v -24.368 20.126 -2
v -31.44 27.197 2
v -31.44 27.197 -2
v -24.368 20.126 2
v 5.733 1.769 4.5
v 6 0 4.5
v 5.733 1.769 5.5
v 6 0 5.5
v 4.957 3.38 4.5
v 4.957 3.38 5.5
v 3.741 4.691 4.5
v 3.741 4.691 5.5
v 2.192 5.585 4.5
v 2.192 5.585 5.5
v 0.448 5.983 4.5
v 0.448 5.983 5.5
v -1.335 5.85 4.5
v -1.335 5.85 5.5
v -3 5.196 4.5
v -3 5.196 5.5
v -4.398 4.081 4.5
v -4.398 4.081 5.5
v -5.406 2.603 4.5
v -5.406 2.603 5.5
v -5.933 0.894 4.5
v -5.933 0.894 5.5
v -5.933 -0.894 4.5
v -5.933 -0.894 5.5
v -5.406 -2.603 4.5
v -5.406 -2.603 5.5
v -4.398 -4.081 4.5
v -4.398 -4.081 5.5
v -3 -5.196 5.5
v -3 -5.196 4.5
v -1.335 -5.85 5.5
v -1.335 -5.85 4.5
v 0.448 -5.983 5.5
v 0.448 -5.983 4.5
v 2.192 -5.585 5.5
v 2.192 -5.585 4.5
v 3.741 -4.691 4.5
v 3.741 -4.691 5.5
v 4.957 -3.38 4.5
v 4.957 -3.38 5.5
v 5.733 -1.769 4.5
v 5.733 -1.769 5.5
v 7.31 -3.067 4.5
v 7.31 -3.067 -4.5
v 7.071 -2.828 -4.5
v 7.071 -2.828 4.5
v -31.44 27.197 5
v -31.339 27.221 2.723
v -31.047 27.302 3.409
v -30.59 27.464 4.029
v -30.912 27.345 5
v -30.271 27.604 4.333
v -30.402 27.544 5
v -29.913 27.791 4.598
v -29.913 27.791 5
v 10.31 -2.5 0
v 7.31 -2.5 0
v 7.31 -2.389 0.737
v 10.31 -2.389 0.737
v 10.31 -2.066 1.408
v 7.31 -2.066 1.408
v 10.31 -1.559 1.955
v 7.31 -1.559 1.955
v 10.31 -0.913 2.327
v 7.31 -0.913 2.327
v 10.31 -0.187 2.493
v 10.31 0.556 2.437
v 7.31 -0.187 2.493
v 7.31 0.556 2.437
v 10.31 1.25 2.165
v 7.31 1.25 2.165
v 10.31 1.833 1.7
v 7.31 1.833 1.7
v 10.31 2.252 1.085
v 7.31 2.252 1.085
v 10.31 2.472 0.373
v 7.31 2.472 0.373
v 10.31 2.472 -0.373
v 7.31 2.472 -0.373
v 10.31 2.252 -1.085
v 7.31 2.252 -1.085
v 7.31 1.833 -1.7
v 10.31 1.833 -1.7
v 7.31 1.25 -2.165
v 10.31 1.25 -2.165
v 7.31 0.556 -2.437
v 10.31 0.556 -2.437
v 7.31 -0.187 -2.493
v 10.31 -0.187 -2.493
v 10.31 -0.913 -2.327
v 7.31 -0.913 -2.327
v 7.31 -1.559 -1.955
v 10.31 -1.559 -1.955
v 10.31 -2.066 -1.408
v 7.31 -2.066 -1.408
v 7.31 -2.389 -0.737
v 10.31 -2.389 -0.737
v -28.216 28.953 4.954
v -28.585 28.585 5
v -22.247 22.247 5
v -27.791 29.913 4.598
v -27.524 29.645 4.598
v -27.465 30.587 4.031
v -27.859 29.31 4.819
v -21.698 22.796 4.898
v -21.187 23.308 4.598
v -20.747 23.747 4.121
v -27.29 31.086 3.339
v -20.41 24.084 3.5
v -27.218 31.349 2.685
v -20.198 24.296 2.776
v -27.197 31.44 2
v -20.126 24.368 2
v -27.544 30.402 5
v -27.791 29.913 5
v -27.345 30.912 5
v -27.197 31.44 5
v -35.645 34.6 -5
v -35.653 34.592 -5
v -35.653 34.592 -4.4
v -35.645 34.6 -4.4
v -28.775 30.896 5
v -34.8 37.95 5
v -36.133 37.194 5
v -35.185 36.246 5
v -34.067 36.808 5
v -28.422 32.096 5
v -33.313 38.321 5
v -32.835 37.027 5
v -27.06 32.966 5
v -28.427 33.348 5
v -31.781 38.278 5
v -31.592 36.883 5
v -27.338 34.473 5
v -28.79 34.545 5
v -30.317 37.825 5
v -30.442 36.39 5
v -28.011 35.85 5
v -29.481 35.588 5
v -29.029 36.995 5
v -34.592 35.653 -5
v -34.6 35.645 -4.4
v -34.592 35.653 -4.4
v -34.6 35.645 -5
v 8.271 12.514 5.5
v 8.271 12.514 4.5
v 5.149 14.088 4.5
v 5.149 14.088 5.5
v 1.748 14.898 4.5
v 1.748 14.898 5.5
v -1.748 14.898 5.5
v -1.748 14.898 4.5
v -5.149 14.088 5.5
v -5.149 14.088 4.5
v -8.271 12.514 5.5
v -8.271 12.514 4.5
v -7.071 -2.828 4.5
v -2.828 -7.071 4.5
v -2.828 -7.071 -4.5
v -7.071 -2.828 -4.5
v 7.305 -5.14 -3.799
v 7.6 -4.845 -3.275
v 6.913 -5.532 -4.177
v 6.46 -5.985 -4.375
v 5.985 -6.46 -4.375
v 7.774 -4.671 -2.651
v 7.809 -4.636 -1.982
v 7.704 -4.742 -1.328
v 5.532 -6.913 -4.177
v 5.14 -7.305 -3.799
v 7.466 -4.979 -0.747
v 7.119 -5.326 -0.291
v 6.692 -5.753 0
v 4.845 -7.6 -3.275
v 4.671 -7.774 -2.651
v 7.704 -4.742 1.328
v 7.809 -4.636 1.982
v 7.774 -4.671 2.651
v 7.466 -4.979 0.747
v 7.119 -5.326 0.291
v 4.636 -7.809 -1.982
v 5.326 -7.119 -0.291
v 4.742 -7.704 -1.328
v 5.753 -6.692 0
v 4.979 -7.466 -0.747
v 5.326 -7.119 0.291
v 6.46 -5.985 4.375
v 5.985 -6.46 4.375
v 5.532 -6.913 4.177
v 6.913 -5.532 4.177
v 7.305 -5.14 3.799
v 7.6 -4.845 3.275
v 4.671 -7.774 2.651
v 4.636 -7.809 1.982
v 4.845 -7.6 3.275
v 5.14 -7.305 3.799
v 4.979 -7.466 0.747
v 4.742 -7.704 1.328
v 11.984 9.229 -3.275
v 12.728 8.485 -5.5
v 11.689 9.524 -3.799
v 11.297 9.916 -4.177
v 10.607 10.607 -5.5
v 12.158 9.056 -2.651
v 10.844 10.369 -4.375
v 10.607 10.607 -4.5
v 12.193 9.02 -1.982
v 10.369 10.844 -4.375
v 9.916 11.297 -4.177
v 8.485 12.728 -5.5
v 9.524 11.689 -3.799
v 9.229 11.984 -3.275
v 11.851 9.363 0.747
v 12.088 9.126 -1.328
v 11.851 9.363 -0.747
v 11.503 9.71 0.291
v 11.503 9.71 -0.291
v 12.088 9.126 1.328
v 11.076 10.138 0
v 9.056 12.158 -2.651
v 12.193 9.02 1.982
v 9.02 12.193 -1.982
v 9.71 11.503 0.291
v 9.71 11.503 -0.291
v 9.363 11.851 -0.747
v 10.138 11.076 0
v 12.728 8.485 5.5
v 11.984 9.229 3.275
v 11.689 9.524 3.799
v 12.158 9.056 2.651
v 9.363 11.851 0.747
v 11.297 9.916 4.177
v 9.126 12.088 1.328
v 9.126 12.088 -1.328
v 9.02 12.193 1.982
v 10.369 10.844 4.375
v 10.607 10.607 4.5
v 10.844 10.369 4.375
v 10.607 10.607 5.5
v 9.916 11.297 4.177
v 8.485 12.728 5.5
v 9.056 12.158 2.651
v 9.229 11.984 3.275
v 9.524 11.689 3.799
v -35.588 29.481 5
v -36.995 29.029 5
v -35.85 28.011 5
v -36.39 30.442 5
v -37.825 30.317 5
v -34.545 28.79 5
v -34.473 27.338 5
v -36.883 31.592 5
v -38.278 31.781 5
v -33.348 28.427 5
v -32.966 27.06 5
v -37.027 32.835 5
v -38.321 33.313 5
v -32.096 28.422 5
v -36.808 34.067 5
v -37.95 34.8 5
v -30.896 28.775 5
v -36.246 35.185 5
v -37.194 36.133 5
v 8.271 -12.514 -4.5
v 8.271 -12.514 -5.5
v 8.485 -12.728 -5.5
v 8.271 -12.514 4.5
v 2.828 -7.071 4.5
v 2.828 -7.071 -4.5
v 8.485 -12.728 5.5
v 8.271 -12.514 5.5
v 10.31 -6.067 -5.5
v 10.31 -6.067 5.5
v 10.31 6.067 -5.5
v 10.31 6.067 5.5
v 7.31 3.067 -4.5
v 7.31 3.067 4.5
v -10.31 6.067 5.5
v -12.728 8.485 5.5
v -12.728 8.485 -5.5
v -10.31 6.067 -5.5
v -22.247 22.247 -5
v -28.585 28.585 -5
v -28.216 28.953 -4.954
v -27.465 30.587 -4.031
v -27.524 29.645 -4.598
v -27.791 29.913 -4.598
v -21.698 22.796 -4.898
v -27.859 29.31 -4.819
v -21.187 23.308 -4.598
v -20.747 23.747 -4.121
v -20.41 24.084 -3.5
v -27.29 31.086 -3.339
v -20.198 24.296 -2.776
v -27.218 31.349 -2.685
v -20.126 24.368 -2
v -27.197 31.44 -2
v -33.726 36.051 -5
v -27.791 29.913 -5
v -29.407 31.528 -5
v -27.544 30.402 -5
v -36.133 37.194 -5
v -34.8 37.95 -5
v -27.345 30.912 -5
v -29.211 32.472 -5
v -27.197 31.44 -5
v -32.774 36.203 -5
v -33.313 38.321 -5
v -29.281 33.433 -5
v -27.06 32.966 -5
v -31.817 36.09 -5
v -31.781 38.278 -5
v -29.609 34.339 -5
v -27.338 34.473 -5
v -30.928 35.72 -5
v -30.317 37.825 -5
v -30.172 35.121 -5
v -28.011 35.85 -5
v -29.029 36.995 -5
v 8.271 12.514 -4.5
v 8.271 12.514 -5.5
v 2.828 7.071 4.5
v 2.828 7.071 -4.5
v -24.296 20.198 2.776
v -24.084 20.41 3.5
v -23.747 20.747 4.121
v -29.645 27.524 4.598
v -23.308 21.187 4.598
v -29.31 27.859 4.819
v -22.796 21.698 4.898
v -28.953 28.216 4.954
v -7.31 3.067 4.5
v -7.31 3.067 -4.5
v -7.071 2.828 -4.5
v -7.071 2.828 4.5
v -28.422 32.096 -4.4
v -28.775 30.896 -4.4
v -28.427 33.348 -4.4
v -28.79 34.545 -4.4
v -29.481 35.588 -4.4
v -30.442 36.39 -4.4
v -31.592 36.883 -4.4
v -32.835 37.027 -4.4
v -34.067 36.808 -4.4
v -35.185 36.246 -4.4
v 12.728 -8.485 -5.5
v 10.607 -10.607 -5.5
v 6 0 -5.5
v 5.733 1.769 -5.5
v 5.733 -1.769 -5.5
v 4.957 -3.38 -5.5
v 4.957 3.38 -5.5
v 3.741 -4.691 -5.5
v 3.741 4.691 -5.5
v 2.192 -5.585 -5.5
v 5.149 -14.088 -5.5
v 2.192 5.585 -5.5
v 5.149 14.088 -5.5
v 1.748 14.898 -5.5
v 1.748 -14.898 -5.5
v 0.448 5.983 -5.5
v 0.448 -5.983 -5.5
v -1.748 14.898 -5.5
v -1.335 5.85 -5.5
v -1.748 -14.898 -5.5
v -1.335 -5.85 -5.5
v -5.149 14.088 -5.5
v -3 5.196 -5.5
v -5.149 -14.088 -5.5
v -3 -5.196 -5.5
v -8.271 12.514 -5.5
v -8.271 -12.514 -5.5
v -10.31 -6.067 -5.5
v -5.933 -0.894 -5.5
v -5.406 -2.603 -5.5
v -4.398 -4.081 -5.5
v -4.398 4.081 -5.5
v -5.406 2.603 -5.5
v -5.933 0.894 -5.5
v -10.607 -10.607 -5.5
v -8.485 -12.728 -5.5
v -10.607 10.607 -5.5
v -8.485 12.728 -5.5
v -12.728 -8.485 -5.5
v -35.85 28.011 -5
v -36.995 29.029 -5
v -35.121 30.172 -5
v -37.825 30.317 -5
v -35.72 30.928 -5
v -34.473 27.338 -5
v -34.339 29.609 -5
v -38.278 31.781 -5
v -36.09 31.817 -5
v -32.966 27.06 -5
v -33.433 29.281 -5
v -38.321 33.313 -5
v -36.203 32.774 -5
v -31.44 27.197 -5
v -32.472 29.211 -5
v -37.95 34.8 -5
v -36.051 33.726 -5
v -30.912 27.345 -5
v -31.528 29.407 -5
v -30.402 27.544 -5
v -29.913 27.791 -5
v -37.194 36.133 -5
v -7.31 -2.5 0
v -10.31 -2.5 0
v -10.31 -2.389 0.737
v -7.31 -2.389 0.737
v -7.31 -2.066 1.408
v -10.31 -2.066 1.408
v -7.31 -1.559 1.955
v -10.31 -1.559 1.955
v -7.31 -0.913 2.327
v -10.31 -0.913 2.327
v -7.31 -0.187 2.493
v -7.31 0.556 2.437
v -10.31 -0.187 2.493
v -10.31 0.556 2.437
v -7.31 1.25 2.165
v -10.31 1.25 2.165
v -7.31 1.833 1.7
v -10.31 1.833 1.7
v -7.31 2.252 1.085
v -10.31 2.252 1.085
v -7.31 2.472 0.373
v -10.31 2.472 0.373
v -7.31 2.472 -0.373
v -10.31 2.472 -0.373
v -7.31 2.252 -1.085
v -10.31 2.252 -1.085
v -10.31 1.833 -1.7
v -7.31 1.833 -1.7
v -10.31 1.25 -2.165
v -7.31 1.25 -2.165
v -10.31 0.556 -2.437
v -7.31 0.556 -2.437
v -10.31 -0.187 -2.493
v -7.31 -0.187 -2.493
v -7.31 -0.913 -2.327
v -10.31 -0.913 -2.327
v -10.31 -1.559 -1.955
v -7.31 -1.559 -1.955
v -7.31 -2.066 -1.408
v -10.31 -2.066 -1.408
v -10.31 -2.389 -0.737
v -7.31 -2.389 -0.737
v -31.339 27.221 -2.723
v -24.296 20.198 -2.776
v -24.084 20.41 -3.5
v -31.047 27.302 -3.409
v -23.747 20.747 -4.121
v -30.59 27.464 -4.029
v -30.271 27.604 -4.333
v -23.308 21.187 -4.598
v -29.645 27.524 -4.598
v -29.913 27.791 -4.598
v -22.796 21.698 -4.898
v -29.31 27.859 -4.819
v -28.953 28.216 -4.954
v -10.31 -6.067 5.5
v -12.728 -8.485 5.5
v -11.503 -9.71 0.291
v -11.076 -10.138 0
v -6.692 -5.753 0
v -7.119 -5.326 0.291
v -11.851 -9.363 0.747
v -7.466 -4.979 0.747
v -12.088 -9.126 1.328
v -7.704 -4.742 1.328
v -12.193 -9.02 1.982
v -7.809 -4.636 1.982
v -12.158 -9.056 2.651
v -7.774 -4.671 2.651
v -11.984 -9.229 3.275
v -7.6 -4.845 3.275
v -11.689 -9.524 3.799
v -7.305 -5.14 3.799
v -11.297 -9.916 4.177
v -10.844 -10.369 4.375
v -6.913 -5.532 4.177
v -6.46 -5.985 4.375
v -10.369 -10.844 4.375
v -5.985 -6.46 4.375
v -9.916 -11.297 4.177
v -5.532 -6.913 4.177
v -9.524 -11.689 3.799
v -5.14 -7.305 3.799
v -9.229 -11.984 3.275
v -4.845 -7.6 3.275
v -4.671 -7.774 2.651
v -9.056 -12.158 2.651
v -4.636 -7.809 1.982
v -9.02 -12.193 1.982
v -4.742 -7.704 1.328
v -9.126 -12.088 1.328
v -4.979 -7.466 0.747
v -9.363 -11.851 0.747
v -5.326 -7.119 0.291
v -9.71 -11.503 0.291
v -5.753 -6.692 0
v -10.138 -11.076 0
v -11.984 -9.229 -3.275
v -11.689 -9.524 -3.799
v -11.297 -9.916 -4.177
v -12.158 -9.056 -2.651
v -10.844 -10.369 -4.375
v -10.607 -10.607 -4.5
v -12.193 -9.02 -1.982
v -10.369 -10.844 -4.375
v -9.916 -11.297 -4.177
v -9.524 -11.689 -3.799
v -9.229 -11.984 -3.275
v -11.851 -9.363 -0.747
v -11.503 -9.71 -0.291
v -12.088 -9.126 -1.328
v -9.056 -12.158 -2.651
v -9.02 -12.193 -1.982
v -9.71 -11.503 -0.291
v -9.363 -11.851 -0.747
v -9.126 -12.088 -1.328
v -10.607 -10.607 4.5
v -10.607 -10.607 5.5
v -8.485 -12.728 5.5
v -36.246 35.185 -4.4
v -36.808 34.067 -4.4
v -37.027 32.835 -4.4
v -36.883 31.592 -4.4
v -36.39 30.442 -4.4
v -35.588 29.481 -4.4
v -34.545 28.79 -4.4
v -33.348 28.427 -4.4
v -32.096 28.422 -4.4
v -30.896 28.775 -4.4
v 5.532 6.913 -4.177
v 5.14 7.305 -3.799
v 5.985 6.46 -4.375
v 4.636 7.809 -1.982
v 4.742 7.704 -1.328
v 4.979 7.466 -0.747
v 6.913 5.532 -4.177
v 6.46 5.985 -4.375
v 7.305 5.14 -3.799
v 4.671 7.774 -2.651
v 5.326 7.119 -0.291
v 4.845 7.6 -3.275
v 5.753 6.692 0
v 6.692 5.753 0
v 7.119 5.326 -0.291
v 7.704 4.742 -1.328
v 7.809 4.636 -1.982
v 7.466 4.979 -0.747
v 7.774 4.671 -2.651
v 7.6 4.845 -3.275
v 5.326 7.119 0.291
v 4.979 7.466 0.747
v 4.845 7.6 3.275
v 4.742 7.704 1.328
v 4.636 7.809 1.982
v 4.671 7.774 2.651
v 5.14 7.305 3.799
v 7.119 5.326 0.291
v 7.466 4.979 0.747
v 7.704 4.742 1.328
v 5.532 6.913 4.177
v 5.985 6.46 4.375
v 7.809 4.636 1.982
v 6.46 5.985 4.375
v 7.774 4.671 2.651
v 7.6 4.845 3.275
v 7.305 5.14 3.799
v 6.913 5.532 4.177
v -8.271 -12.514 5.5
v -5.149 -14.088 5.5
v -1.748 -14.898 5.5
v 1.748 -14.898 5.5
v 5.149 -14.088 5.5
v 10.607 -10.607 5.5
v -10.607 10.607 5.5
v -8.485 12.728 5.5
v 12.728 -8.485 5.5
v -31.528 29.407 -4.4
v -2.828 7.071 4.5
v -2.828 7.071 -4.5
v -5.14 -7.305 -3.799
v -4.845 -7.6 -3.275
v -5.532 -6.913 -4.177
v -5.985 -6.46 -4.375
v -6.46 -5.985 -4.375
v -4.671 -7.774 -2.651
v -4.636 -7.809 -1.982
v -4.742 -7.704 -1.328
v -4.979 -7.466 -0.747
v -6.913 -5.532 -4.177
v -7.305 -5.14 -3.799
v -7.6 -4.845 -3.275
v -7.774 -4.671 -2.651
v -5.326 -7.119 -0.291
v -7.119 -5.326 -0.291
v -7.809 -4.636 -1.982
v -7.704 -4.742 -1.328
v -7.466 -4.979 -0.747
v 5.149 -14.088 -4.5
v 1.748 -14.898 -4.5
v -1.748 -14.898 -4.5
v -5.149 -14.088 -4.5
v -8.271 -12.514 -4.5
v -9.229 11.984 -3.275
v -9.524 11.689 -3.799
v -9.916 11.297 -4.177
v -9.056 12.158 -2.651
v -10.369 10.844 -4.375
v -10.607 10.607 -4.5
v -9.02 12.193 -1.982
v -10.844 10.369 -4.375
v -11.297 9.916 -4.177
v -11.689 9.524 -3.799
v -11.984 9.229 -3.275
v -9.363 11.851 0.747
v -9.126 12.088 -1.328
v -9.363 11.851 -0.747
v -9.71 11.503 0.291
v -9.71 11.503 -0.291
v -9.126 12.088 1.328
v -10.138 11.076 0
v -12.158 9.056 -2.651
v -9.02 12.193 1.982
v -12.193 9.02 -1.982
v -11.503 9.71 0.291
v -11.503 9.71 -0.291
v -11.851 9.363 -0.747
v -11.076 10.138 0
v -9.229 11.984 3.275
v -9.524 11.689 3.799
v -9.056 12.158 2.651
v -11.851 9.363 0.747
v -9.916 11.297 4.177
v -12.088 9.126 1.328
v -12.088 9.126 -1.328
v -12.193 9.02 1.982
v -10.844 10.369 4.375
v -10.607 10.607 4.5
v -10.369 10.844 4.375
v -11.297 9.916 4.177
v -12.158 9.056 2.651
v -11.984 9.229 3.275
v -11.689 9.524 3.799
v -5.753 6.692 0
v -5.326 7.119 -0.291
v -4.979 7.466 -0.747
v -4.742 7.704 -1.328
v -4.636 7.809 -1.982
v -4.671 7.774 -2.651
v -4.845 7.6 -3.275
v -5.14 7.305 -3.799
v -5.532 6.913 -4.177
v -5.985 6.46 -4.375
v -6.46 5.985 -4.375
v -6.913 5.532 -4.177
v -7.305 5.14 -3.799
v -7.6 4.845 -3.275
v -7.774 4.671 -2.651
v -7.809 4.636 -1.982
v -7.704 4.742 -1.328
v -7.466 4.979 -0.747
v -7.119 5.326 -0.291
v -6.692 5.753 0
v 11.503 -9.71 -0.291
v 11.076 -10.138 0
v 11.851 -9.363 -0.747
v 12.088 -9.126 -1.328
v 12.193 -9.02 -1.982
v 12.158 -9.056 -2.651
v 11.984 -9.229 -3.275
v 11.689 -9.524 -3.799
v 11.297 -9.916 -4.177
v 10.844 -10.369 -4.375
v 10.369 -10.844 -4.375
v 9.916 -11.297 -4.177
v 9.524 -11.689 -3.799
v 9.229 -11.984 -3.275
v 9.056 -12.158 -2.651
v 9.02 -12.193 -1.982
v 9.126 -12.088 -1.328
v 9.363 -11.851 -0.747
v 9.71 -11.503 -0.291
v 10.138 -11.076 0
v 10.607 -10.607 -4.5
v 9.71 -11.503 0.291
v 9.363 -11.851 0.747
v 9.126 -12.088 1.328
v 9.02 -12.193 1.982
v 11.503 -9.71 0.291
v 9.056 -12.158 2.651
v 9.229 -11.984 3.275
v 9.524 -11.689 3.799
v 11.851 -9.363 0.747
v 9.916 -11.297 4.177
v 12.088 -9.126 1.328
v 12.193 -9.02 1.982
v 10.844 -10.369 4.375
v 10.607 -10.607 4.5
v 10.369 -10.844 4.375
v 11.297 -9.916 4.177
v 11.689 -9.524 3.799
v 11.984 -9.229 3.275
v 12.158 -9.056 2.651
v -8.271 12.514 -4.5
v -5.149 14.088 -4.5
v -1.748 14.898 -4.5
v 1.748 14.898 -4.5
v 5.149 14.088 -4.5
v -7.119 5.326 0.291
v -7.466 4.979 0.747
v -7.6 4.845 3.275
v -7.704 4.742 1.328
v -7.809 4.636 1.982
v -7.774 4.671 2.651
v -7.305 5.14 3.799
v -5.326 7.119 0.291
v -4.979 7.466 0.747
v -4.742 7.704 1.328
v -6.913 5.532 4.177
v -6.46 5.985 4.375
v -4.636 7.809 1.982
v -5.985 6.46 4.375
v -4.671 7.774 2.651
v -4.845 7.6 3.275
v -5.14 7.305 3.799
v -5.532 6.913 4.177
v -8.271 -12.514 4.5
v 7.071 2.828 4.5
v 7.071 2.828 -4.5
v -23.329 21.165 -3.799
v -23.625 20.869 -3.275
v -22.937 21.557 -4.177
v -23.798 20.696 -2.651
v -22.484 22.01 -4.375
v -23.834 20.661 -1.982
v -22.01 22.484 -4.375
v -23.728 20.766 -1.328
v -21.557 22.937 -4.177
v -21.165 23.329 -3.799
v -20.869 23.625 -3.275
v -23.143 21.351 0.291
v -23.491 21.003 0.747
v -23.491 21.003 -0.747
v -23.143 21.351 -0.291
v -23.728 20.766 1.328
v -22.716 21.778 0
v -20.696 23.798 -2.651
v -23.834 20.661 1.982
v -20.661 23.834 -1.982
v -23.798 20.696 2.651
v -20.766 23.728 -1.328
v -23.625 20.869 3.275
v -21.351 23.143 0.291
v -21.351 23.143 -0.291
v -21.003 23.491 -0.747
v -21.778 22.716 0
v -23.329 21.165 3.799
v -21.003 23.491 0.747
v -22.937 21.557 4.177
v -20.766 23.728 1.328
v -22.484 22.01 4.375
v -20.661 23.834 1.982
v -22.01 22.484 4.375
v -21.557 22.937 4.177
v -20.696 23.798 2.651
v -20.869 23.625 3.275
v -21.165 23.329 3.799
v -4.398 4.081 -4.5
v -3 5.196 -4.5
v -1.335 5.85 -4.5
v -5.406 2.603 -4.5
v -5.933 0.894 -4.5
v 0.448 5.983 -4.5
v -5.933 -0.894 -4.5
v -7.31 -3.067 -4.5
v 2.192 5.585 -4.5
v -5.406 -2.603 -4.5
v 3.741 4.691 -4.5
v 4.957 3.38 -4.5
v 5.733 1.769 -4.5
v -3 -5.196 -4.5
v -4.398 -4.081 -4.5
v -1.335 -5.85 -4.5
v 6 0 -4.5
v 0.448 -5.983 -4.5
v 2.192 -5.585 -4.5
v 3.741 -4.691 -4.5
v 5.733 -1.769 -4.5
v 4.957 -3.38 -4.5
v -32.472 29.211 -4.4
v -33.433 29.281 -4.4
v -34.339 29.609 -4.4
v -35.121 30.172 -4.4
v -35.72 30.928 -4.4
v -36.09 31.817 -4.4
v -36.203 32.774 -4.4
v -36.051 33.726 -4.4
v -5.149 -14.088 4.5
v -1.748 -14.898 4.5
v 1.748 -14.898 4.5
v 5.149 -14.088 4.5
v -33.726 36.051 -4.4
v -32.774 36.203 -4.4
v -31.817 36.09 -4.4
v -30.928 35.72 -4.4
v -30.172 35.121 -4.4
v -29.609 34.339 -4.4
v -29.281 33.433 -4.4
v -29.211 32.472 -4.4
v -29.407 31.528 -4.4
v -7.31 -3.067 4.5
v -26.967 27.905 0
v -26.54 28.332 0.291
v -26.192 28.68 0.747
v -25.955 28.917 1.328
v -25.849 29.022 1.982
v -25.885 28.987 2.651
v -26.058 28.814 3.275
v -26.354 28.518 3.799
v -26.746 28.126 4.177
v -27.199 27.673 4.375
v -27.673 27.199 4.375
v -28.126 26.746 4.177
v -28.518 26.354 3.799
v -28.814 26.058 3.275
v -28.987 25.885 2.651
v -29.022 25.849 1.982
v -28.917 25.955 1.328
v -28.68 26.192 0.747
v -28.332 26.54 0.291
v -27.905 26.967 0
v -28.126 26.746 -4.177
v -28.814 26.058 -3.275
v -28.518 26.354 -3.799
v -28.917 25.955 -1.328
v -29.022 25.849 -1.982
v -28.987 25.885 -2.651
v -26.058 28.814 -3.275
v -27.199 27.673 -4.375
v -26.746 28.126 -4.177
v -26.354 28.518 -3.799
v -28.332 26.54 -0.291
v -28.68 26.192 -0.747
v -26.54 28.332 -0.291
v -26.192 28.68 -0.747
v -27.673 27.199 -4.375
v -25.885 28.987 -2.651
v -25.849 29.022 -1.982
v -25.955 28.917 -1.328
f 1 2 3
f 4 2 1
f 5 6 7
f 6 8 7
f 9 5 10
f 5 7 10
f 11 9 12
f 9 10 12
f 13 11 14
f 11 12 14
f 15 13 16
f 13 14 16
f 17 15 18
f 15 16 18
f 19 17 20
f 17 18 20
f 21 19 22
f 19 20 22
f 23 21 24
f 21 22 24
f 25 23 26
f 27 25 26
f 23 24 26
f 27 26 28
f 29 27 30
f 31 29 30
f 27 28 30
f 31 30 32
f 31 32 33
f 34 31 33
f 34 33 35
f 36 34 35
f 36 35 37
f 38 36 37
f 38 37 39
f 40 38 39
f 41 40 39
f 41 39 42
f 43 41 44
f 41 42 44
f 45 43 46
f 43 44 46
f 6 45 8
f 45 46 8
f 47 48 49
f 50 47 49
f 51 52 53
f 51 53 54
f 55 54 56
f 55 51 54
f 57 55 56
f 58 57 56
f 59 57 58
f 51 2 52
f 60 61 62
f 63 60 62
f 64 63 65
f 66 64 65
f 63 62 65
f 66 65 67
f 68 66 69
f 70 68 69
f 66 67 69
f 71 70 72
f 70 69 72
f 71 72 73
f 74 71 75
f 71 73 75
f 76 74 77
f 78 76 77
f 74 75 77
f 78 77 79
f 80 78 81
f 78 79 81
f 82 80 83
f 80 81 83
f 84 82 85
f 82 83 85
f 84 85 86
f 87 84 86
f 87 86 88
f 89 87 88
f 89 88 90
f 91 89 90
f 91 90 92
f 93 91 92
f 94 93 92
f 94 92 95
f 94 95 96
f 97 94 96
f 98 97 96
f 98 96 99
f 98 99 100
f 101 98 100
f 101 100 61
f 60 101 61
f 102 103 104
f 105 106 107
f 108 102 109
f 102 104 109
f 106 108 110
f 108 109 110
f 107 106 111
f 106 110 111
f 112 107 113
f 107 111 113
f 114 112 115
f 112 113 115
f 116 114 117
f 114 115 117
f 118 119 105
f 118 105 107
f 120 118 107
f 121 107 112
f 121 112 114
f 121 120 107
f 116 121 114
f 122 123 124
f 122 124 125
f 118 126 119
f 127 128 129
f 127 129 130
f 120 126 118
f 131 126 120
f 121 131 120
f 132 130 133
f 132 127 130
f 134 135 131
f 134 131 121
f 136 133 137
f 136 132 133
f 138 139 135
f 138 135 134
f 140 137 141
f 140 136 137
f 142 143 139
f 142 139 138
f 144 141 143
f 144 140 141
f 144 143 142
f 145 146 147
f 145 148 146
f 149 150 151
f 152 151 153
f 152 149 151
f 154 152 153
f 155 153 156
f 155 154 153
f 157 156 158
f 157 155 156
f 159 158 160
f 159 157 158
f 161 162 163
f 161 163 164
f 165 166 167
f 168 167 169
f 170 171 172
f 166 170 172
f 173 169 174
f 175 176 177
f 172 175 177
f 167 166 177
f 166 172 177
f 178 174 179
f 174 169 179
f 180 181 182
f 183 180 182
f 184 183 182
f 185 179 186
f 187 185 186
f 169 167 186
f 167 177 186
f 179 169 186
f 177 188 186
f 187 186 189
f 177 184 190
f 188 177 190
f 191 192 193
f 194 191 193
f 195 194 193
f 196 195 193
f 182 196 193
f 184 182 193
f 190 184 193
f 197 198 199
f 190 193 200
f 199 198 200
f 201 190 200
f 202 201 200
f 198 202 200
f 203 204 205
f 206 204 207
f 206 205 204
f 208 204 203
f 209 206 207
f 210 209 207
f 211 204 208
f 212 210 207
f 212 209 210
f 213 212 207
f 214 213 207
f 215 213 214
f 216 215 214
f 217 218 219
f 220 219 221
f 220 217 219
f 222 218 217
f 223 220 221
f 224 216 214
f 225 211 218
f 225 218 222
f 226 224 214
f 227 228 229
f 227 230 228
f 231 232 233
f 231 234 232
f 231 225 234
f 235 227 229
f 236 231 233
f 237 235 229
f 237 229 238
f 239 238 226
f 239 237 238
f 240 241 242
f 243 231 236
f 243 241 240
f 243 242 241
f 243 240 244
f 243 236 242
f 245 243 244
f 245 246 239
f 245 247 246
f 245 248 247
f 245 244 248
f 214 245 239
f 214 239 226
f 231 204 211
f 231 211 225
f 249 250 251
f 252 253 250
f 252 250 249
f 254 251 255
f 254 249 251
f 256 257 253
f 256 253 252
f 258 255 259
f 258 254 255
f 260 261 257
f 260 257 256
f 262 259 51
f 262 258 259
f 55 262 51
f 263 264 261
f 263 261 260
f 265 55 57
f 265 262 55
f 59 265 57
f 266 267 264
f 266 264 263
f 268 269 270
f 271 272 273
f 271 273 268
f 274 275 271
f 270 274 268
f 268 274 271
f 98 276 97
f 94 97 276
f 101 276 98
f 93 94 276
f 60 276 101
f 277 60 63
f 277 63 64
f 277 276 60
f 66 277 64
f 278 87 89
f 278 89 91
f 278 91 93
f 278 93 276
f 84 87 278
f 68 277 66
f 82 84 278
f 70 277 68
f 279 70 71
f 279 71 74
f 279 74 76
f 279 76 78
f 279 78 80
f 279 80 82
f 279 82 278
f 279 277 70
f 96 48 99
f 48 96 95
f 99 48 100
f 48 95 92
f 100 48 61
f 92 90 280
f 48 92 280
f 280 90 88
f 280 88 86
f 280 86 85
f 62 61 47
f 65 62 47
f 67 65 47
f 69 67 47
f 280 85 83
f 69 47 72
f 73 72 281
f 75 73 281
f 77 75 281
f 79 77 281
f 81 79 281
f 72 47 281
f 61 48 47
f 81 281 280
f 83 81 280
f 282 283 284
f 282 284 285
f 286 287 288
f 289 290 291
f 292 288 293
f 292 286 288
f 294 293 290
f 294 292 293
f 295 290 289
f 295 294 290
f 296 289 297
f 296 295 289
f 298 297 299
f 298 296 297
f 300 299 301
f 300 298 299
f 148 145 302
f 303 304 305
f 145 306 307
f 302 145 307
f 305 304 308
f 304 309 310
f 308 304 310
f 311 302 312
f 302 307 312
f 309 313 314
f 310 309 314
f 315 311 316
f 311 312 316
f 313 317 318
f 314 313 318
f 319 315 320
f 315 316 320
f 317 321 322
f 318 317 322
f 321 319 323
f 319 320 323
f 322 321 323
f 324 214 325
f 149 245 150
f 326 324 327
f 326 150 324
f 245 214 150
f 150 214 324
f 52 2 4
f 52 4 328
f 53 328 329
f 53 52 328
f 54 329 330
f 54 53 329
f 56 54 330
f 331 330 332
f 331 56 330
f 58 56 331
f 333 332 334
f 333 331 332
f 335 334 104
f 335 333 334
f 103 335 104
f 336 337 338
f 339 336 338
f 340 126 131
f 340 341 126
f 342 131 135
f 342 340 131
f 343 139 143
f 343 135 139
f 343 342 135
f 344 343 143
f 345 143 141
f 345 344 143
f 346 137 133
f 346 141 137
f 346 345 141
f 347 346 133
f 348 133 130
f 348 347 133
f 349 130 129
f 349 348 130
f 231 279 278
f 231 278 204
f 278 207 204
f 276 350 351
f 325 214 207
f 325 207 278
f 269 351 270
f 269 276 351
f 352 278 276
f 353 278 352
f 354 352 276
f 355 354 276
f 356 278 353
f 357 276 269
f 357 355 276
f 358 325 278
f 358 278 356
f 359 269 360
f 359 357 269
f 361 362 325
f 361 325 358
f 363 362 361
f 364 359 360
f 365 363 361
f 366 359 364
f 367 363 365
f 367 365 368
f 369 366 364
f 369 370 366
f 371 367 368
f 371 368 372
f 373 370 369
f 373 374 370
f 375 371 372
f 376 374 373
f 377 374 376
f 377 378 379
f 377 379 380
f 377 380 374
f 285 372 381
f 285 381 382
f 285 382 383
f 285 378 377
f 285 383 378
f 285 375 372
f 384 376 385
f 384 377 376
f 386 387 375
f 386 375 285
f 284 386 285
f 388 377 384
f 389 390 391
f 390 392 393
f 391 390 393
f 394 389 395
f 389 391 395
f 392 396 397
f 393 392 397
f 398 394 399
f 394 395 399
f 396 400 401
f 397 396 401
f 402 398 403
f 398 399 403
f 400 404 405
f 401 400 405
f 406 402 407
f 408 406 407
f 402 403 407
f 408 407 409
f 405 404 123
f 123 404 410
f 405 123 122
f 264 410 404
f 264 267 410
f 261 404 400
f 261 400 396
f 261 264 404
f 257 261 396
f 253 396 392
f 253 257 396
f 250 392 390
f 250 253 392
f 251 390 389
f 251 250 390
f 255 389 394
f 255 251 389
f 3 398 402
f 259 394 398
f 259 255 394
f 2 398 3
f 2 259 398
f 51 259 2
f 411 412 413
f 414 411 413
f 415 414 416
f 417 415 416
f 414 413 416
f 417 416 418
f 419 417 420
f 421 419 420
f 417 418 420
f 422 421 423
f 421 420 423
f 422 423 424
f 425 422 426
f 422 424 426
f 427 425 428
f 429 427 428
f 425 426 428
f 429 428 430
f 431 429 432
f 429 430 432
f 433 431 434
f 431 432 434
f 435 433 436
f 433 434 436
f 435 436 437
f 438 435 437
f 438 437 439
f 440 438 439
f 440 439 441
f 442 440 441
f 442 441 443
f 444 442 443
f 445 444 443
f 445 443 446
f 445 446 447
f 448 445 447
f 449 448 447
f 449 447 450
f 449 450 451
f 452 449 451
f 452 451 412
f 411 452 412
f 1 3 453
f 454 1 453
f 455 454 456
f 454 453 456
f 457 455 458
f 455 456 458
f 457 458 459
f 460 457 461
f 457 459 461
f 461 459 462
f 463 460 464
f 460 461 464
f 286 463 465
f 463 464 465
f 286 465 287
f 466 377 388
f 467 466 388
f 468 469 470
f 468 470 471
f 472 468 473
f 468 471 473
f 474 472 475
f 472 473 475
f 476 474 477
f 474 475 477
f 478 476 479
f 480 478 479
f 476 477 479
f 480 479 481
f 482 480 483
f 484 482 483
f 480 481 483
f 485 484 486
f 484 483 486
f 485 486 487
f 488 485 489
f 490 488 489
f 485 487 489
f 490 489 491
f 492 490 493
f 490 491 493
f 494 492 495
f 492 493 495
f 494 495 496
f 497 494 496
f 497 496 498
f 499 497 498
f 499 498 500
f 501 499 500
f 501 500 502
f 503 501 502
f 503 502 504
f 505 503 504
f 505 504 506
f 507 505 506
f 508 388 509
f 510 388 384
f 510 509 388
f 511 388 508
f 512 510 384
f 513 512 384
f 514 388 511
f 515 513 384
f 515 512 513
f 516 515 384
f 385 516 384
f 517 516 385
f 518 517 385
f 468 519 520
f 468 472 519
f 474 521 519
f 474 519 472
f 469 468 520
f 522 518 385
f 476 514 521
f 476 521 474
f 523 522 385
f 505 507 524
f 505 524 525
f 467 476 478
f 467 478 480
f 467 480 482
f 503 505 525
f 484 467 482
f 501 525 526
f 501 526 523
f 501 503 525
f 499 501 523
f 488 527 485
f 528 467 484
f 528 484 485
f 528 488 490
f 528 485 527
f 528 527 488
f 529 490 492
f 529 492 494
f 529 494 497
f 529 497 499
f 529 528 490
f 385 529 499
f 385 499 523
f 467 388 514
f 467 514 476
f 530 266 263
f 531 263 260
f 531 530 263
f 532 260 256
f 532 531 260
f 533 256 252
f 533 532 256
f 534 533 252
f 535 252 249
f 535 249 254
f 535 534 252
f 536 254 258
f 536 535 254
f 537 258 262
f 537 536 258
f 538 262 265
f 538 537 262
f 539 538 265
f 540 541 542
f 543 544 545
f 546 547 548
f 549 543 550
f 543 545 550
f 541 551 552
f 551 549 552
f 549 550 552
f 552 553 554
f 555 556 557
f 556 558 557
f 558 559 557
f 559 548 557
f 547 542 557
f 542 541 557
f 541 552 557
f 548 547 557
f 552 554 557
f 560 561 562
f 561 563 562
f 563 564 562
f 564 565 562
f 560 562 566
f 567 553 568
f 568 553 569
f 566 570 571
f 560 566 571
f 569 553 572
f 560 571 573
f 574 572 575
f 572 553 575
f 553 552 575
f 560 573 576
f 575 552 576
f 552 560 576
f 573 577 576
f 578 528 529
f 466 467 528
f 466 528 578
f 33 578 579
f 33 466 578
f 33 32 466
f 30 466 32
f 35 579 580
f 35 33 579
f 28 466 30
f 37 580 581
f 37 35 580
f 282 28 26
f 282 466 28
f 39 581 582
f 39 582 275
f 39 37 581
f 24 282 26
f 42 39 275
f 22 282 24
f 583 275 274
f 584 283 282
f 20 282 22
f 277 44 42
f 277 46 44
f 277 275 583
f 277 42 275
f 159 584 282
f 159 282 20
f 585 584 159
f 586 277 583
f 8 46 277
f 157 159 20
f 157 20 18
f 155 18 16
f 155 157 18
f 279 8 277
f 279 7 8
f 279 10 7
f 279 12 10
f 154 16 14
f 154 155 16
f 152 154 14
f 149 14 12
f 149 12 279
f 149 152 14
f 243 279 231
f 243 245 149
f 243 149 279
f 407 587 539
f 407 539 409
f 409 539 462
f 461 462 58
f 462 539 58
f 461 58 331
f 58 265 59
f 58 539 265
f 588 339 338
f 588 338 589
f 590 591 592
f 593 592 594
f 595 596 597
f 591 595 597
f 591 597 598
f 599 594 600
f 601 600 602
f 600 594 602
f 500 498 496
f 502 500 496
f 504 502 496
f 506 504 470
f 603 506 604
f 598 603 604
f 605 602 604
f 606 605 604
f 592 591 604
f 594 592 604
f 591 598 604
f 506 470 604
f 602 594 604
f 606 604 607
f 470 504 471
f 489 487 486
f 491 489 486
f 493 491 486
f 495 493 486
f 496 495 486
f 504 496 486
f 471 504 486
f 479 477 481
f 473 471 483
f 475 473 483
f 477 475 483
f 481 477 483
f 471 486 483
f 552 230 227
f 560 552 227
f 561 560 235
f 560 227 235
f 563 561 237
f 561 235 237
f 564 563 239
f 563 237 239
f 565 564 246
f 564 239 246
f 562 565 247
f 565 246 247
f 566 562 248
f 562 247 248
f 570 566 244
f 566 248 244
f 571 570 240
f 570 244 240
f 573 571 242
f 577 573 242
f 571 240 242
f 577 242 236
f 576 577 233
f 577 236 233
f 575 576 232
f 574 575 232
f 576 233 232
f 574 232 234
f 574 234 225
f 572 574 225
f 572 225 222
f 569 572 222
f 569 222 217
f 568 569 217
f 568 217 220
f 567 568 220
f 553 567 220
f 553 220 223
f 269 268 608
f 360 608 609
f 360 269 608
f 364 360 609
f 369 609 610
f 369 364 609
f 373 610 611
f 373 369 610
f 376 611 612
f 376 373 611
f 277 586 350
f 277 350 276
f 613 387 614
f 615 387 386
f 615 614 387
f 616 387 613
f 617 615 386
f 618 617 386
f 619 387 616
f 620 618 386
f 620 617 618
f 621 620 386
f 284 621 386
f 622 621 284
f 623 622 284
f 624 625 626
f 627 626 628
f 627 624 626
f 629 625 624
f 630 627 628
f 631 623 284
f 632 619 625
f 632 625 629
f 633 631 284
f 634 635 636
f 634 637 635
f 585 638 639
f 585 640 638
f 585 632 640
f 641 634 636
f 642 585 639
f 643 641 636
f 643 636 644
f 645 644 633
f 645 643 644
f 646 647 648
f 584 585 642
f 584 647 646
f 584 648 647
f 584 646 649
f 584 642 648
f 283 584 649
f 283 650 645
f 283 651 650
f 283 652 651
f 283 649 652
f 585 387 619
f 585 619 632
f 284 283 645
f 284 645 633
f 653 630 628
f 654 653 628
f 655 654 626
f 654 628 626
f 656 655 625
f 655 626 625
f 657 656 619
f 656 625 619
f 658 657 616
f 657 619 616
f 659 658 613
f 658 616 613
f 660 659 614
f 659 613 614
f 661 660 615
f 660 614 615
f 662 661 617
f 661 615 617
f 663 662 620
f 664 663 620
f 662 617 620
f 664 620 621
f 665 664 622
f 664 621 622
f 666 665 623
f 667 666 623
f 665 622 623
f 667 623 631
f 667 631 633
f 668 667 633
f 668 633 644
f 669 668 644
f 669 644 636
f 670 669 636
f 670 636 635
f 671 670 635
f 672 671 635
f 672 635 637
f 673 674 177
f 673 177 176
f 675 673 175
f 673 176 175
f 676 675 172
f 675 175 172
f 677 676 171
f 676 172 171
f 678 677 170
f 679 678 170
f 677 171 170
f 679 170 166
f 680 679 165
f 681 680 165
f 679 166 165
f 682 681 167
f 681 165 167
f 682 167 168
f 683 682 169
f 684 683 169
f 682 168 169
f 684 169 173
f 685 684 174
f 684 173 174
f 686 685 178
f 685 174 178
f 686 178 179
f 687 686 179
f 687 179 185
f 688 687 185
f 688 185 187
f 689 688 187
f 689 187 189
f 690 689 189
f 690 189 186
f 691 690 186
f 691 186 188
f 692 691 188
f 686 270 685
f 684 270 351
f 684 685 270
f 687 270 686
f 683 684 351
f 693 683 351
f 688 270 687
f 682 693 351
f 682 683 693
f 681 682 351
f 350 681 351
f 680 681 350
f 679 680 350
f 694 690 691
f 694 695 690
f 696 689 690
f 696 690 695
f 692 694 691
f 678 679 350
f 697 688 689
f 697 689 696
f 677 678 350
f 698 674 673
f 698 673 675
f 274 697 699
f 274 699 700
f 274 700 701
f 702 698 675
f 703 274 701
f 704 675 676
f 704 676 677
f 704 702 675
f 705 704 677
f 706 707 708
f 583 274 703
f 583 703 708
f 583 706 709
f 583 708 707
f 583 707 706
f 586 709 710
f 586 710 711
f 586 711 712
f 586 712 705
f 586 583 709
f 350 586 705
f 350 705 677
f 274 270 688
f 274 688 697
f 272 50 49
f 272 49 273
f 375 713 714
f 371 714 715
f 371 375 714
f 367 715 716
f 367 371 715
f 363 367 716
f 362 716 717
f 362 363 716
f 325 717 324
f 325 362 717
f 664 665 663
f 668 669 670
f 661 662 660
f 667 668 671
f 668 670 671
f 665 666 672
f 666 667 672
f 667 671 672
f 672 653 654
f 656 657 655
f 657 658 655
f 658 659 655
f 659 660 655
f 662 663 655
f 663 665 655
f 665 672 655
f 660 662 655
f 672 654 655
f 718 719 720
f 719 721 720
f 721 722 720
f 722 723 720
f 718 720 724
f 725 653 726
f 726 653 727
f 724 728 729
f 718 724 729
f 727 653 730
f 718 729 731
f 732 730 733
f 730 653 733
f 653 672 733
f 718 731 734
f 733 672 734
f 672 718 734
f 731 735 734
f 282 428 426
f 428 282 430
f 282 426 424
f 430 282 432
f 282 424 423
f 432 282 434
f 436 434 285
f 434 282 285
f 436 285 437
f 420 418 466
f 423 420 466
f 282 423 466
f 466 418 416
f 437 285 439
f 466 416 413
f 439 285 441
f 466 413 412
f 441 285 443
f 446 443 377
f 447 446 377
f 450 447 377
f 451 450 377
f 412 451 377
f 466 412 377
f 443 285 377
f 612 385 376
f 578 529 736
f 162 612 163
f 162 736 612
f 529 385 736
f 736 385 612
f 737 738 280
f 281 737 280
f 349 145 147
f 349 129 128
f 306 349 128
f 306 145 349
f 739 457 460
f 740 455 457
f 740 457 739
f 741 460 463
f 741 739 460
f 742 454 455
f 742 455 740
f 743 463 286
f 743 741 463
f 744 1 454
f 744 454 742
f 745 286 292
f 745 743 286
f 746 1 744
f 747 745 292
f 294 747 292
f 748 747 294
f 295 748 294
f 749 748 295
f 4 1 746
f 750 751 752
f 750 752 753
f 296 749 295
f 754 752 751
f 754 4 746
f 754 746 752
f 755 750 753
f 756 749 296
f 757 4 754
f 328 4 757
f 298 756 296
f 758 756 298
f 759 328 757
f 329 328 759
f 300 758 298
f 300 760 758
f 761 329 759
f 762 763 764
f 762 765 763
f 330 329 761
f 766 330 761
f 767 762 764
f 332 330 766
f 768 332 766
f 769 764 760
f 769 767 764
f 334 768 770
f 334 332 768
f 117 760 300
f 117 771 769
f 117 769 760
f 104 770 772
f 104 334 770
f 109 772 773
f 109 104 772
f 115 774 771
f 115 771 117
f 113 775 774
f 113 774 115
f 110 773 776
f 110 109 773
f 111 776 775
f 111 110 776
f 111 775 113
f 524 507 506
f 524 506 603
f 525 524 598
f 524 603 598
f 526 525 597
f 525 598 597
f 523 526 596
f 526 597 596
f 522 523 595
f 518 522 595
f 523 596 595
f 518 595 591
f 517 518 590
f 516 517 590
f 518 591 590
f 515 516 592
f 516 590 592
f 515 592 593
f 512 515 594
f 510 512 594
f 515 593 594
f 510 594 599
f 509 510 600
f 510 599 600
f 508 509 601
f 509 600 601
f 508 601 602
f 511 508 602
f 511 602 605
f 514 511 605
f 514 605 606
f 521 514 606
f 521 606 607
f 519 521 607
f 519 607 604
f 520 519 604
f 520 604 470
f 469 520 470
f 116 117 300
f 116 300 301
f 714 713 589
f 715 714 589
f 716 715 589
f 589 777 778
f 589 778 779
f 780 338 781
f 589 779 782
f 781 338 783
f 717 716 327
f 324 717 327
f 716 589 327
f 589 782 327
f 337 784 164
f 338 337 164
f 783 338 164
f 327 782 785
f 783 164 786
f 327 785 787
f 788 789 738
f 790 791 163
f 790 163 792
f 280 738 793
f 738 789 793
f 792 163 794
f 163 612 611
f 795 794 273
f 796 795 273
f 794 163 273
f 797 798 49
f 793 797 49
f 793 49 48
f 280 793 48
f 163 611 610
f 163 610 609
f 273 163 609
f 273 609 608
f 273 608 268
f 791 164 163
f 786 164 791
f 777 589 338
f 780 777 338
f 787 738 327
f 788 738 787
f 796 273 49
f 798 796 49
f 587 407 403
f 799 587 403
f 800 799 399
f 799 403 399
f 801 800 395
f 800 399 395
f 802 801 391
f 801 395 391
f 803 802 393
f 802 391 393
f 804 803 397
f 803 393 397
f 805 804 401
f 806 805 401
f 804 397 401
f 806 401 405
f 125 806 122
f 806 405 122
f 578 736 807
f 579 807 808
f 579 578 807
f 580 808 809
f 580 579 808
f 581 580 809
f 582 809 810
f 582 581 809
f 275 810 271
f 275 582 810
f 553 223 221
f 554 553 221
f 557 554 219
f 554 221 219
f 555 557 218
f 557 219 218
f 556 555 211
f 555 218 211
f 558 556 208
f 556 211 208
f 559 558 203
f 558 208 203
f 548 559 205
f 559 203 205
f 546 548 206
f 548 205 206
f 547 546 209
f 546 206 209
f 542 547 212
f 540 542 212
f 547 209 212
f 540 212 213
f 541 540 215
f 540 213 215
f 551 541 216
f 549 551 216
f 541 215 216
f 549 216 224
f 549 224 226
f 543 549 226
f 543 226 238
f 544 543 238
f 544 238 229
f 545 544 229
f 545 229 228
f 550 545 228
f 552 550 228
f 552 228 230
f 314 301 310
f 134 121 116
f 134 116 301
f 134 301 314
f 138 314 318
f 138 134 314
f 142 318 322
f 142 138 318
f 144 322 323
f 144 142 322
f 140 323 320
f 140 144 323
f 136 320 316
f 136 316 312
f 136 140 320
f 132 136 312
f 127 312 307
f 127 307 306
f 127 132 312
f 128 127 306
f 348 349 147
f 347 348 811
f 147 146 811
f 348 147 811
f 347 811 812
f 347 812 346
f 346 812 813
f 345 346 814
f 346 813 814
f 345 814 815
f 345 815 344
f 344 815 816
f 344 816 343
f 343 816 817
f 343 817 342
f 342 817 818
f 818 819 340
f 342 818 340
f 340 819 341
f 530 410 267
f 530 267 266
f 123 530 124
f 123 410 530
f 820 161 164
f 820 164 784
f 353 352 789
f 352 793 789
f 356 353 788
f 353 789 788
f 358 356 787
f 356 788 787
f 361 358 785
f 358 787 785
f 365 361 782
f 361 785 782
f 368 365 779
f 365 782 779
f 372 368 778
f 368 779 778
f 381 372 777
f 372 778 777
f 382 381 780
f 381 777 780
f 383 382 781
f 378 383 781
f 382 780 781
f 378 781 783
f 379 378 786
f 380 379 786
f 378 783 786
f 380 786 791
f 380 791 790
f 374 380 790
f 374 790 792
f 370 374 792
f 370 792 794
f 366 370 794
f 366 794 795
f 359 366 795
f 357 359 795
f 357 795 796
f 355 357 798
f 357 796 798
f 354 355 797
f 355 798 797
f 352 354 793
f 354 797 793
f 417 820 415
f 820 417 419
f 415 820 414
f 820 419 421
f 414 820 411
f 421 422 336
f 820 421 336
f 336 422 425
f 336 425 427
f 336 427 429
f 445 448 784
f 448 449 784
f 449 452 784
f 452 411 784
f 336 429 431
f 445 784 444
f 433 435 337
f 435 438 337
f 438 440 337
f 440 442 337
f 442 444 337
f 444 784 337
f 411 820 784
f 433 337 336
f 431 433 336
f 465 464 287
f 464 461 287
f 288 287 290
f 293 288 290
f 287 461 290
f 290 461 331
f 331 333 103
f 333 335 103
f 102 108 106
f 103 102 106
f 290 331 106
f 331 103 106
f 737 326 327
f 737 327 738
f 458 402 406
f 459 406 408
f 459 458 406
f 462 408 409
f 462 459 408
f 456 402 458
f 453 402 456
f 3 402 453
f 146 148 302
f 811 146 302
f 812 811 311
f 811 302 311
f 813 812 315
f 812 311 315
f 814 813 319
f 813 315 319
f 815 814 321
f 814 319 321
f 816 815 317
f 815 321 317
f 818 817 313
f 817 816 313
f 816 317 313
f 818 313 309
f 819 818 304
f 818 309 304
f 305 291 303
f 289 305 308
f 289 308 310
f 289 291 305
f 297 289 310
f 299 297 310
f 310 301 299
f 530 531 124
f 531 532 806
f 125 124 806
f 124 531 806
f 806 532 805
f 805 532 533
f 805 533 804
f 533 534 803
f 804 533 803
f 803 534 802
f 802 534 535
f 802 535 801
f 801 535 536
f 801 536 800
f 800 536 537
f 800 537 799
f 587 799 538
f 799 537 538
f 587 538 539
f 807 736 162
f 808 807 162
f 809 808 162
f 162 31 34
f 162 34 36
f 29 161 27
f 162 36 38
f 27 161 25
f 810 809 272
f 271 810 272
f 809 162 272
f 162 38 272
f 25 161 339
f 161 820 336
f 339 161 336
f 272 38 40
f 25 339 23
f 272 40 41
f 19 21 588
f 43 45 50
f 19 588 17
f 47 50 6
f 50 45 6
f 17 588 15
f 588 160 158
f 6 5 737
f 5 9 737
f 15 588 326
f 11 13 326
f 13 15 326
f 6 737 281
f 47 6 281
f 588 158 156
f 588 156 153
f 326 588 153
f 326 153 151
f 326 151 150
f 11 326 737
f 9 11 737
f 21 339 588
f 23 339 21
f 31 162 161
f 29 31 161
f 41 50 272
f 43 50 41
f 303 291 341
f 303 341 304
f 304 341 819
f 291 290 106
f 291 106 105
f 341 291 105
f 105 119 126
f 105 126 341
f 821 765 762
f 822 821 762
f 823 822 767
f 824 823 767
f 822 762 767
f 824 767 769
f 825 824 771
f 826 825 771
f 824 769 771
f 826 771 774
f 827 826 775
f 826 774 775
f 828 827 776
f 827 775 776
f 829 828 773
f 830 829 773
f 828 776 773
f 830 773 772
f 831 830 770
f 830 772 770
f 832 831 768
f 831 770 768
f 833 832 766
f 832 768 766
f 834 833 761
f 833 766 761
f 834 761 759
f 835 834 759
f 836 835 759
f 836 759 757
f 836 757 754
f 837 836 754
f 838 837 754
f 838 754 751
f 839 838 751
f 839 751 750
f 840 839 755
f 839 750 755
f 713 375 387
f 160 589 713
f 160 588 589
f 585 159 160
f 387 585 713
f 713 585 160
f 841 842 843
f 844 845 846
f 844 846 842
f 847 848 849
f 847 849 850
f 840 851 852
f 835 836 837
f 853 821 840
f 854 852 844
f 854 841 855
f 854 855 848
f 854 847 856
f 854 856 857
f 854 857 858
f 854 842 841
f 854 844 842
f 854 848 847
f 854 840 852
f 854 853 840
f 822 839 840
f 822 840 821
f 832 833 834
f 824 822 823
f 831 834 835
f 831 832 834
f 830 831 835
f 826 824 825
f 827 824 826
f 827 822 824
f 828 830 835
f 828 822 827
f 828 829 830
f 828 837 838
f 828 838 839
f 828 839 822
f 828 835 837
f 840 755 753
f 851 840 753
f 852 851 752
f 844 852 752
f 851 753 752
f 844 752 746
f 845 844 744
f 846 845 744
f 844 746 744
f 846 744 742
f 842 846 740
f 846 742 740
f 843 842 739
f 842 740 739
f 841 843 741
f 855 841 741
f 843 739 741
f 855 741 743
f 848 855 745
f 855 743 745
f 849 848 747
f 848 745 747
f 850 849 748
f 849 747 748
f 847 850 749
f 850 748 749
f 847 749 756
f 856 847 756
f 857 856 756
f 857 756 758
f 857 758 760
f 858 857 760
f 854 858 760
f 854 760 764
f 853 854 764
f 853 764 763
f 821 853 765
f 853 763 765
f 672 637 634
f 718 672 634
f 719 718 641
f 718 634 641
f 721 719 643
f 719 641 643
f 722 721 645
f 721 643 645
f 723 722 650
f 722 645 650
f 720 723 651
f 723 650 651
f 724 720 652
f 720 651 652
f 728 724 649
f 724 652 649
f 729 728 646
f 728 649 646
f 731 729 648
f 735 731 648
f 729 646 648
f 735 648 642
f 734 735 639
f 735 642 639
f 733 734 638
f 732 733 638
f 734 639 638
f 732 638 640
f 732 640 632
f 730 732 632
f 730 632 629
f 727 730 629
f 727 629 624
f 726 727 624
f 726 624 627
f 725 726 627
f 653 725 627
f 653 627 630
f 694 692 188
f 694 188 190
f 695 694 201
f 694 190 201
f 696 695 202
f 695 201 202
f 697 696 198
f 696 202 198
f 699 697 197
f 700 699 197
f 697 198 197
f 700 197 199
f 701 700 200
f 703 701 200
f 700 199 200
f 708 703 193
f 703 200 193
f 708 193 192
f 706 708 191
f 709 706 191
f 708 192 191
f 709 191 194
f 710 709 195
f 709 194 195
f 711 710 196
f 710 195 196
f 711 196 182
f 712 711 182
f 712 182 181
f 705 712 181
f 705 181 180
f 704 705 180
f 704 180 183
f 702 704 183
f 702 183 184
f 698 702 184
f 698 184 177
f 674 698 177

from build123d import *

# Parameters (mm, degrees)
F2_DEPTH      = 5.5
F3_R          = 15
F4_DEPTH      = 1
F5_W          = 3
F5_H          = 12.1347305831
F6_DEPTH      = 5
F7_R          = 15
F8_DEPTH      = 1
F9_R          = 6
F10_DEPTH     = 12.5
F12_DEPTH     = 100
F14_DEPTH     = 100
F15_R         = 2.5
F16_DEPTH     = 100
F17_W         = 6
F17_H         = 11
F18_DEPTH     = 1.8
F19_W         = 6
F19_H         = 9
F20_DEPTH     = 1.8
F21_W         = 6
F21_H         = 9
F22_DEPTH     = 1.8
F23_W         = 6
F23_H         = 9
F24_DEPTH     = 1.8
F25_R         = 5.65
F25_R_2       = 4.325
F26_DEPTH     = 5
F28_DEPTH     = 5
F31_R         = 5.65
F31_R_2       = 3.5
F32_DEPTH     = 0.6
F33_DEPTH     = 12.5
F35_DEPTH     = 7.338
F36_T4_DEPTH  = 25
F36_S5_R      = 5.65
F36_T6_DEPTH  = 16
F36_T10_DEPTH = 25
F36_S11_R     = 5.65
F36_T12_DEPTH = 16
F36_T16_DEPTH = 25
F36_S17_R     = 5.65
F36_T18_DEPTH = 16
F36_T22_DEPTH = 25
F36_S23_R     = 5.65
F36_T24_DEPTH = 16
F37_DEPTH     = 12.5


# Not quite as in the source:
# - a fillet or chamfer that OpenCascade refuses, or shapes differently, is made with other operations: its cross-section is extruded or revolved along the edge and cut away or added


with BuildPart() as f2:
    # F1 (on Top) → F2 (new body, symmetric)
    with BuildSketch(Plane.XY):
        Polygon((12.7279220614, 8.4852813742), (8.4852813742, 12.7279220614), (2.8284271247, 7.0710678119), (7.0710678119, 2.8284271247), align=None)
    extrude(amount=F2_DEPTH, both=True)



with BuildPart() as f2b:
    # F1 (on Top) → F2, piece 2 (new body, symmetric)
    with BuildSketch(Plane.XY):
        Polygon((8.4852813742, -12.7279220614), (12.7279220614, -8.4852813742), (7.0710678119, -2.8284271247), (2.8284271247, -7.0710678119), align=None)
    extrude(amount=F2_DEPTH, both=True)


with BuildPart() as f2c:
    # F1 (on Top) → F2, piece 3 (new body, symmetric)
    with BuildSketch(Plane.XY):
        Polygon((-8.4852813742, -12.7279220614), (-2.8284271247, -7.0710678119), (-7.0710678119, -2.8284271247), (-12.7279220614, -8.4852813742), align=None)
    extrude(amount=F2_DEPTH, both=True)


with BuildPart() as f2d:
    # F1 (on Top) → F2, piece 4 (new body, symmetric)
    with BuildSketch(Plane.XY):
        Polygon((-2.8284271247, 7.0710678119), (-8.4852813742, 12.7279220614), (-12.7279220614, 8.4852813742), (-7.0710678119, 2.8284271247), align=None)
    extrude(amount=F2_DEPTH, both=True)


with BuildPart() as f2_1:
    add(f2.part)

    add(f2b.part)  # F4 merges F2b

    add(f2c.part)  # F4 merges F2c

    add(f2d.part)  # F4 merges F2d
    # F3 (on face) → F4 (join)
    with BuildSketch(Plane.XY.offset(5.5)):
        Circle(F3_R)
    extrude(amount=-F4_DEPTH)

    # F5 (on Top) → F6 (join, symmetric)
    with BuildSketch(Plane.XY):
        with Locations((-8.8100059787, 0)):
            Rectangle(F5_W, F5_H)
        with Locations((8.8100059787, 0)):
            Rectangle(F5_W, F5_H)
    extrude(amount=F6_DEPTH, both=True)

    # F7 (on face) → F8 (join)
    with BuildSketch(Plane(origin=(0, 0, -5.5), x_dir=(1, 0, 0), z_dir=(0, 0, -1))):
        Circle(F7_R)
    extrude(amount=-F8_DEPTH)

    # F9 (on Top) → F10 (cut, symmetric)
    with BuildSketch(Plane.XY):
        Circle(F9_R)
    extrude(amount=F10_DEPTH, both=True, mode=Mode.SUBTRACT)

    # F11 (on face) → F12 (cut)
    with BuildSketch(Plane(origin=(10.6066017178, 10.6066017178, 0), x_dir=(-0.7071067812, 0.7071067812, 0), z_dir=(0.7071067812, 0.7071067812, 0))):
        with BuildLine():
            ThreePointArc((-0.6633249581, 0), (0, -4.4), (0.6633249581, 0))
            ThreePointArc((0.6633249581, 0), (0, 4.4), (-0.6633249581, 0))
        make_face()
    extrude(amount=-F12_DEPTH, mode=Mode.SUBTRACT)

    # F13 (on face) → F14 (cut)
    with BuildSketch(Plane(origin=(-10.6066017178, 10.6066017178, 0), x_dir=(-0.7071067812, -0.7071067812, 0), z_dir=(-0.7071067812, 0.7071067812, 0))):
        with BuildLine():
            ThreePointArc((-0.6633249581, 0), (0, -4.4), (0.6633249581, 0))
            ThreePointArc((0.6633249581, 0), (0, 4.4), (-0.6633249581, 0))
        make_face()
    extrude(amount=-F14_DEPTH, mode=Mode.SUBTRACT)

    # F15 (on face) → F16 (cut)
    with BuildSketch(Plane(origin=(-10.3100059787, 0, 0), x_dir=(0, -1, 0), z_dir=(-1, 0, 0))):
        Circle(F15_R)
    extrude(amount=-F16_DEPTH, mode=Mode.SUBTRACT)

    # F17 (on face) → F18 (join)
    with BuildSketch(Plane(origin=(4.9497474683, -4.9497474683, 0), x_dir=(-0.7071067812, -0.7071067812, 0), z_dir=(-0.7071067812, 0.7071067812, 0))):
        Rectangle(F17_W, F17_H)
    extrude(amount=-F18_DEPTH)

    # F19 (on face) → F20 (join)
    with BuildSketch(Plane(origin=(-4.9497474683, 4.9497474683, 0), x_dir=(0.7071067812, 0.7071067812, 0), z_dir=(0.7071067812, -0.7071067812, 0))):
        Rectangle(F19_W, F19_H)
    extrude(amount=-F20_DEPTH)

    # F21 (on face) → F22 (join)
    with BuildSketch(Plane(origin=(-4.9497474683, -4.9497474683, 0), x_dir=(-0.7071067812, 0.7071067812, 0), z_dir=(0.7071067812, 0.7071067812, 0))):
        Rectangle(F21_W, F21_H)
    extrude(amount=-F22_DEPTH)

    # F23 (on face) → F24 (join)
    with BuildSketch(Plane(origin=(4.9497474683, 4.9497474683, 0), x_dir=(0.7071067812, -0.7071067812, 0), z_dir=(-0.7071067812, -0.7071067812, 0))):
        Rectangle(F23_W, F23_H)
    extrude(amount=-F24_DEPTH)

    # F37 (cut, symmetric): faces of the model
    f37_faces = [f2_1.faces().sort_by_distance(p)[0] for p in [
        (-12.4284977083, 0, -4.5),
        (12.4284977083, 0, -4.5),
    ]]
    extrude(f37_faces, amount=F37_DEPTH, both=True, mode=Mode.SUBTRACT)


with BuildPart() as f26:
    # F25 (on Top) → F26 (new body, symmetric)
    with BuildSketch(Plane.XY):
        with Locations((-32.7036886299, 32.7036886299)):
            Circle(F25_R)
        with Locations((-32.7036886299, 32.7036886299)):
            Circle(F25_R_2, mode=Mode.SUBTRACT)
    extrude(amount=F26_DEPTH, both=True)

    # F27 (on Top) → F28 (join, symmetric)
    with BuildSketch(Plane.XY):
        Polygon((-27.1969214916, 31.4395621787), (-31.4395621787, 27.1969214916), (-24.3684943668, 20.1258536797), (-20.1258536797, 24.3684943668), align=None)
    extrude(amount=F28_DEPTH, both=True)

    # F31 (on face) → F32 (join)
    with BuildSketch(Plane(origin=(0, 0, -5), x_dir=(1, 0, 0), z_dir=(0, 0, -1))):
        with Locations((-32.7036886299, -32.7036886299)):
            Circle(F31_R)
        with Locations((-32.7036886299, -32.7036886299)):
            Circle(F31_R_2, mode=Mode.SUBTRACT)
    extrude(amount=-F32_DEPTH)

    # F30 (on Top) + F29 (on Top) → F33 (cut, symmetric)
    with BuildSketch(Plane.XY):
        Polygon((-38.2369231114, 37.1762629396), (-35.653056475, 34.5923963032), (-34.5923963032, 35.653056475), (-37.1762629396, 38.2369231114), align=None)
    with BuildSketch(Plane.XY):
        Polygon((-29.6454518012, 31.7667721448), (-31.7667721448, 29.6454518012), (-29.6454518012, 27.5241314577), (-27.5241314577, 29.6454518012), align=None)
    extrude(amount=F33_DEPTH, both=True, mode=Mode.SUBTRACT)

    # F34 (on face) → F35 (cut)
    with BuildSketch(Plane(origin=(-22.2471740233, 22.2471740233, 0), x_dir=(0.7071067812, 0.7071067812, 0), z_dir=(0.7071067812, -0.7071067812, 0))):
        with BuildLine():
            ThreePointArc((-0.6633249581, 0), (0, -4.4), (0.6633249581, 0))
            ThreePointArc((0.6633249581, 0), (0, 4.4), (-0.6633249581, 0))
        make_face()
    extrude(amount=-F35_DEPTH, mode=Mode.SUBTRACT)

    # F36: fillet of radius 3 on 4 edges, made by hand


with BuildPart() as f36_tool2:
    # F36_s3 → F36_t4 (new body)
    with BuildSketch(Plane(origin=(-16.9438731644, 16.9438731644, 0), x_dir=(0, 0, 1), z_dir=(-0.7071067812, 0.7071067812, 0))):
        with BuildLine():
            ThreePointArc((5, 0), (4.1213203436, 2.1213203436), (2, 3))
            Line((2, 3), (5, 3))
            Line((5, 3), (5, 0))
        make_face()
    extrude(amount=F36_T4_DEPTH)

    # F36_s5 → F36_t6 (cut, symmetric)
    with BuildSketch(Plane.XY.offset(3.5)):
        with Locations((-32.7036886299, 32.7036886299)):
            Circle(F36_S5_R)
    extrude(amount=F36_T6_DEPTH, both=True, mode=Mode.SUBTRACT)


with BuildPart() as f26_1:
    add(f26.part)

    # F36_t1: cut F36_tool2
    add(f36_tool2.part, mode=Mode.SUBTRACT)


with BuildPart() as f36_tool8:
    # F36_s9 → F36_t10 (new body)
    with BuildSketch(Plane(origin=(-34.621542694, 34.621542694, 0), x_dir=(0, 0, 1), z_dir=(0.7071067812, -0.7071067812, 0))):
        with BuildLine():
            ThreePointArc((2, 3), (4.1213203436, 2.1213203436), (5, 0))
            Line((5, 0), (5, 3))
            Line((5, 3), (2, 3))
        make_face()
    extrude(amount=F36_T10_DEPTH)

    # F36_s11 → F36_t12 (cut, symmetric)
    with BuildSketch(Plane.XY.offset(3.5)):
        with Locations((-32.7036886299, 32.7036886299)):
            Circle(F36_S11_R)
    extrude(amount=F36_T12_DEPTH, both=True, mode=Mode.SUBTRACT)


with BuildPart() as f26_2:
    add(f26_1.part)

    # F36_t7: cut F36_tool8
    add(f36_tool8.part, mode=Mode.SUBTRACT)


with BuildPart() as f36_tool14:
    # F36_s15 → F36_t16 (new body)
    with BuildSketch(Plane(origin=(-16.9438731644, 16.9438731644, 0), x_dir=(0, 0, 1), z_dir=(-0.7071067812, 0.7071067812, 0))):
        with BuildLine():
            ThreePointArc((-5, 0), (-4.1213203436, 2.1213203436), (-2, 3))
            Line((-2, 3), (-5, 3))
            Line((-5, 3), (-5, 0))
        make_face()
    extrude(amount=F36_T16_DEPTH)

    # F36_s17 → F36_t18 (cut, symmetric)
    with BuildSketch(Plane.XY.offset(-3.5)):
        with Locations((-32.7036886299, 32.7036886299)):
            Circle(F36_S17_R)
    extrude(amount=F36_T18_DEPTH, both=True, mode=Mode.SUBTRACT)


with BuildPart() as f26_3:
    add(f26_2.part)

    # F36_t13: cut F36_tool14
    add(f36_tool14.part, mode=Mode.SUBTRACT)


with BuildPart() as f36_tool20:
    # F36_s21 → F36_t22 (new body)
    with BuildSketch(Plane(origin=(-34.621542694, 34.621542694, 0), x_dir=(0, 0, 1), z_dir=(0.7071067812, -0.7071067812, 0))):
        with BuildLine():
            ThreePointArc((-2, 3), (-4.1213203436, 2.1213203436), (-5, 0))
            Line((-5, 0), (-5, 3))
            Line((-5, 3), (-2, 3))
        make_face()
    extrude(amount=F36_T22_DEPTH)

    # F36_s23 → F36_t24 (cut, symmetric)
    with BuildSketch(Plane.XY.offset(-3.5)):
        with Locations((-32.7036886299, 32.7036886299)):
            Circle(F36_S23_R)
    extrude(amount=F36_T24_DEPTH, both=True, mode=Mode.SUBTRACT)


with BuildPart() as f26_4:
    add(f26_3.part)

    # F36_t19: cut F36_tool20
    add(f36_tool20.part, mode=Mode.SUBTRACT)


solid = Compound([f2_1.part, f26_4.part])
